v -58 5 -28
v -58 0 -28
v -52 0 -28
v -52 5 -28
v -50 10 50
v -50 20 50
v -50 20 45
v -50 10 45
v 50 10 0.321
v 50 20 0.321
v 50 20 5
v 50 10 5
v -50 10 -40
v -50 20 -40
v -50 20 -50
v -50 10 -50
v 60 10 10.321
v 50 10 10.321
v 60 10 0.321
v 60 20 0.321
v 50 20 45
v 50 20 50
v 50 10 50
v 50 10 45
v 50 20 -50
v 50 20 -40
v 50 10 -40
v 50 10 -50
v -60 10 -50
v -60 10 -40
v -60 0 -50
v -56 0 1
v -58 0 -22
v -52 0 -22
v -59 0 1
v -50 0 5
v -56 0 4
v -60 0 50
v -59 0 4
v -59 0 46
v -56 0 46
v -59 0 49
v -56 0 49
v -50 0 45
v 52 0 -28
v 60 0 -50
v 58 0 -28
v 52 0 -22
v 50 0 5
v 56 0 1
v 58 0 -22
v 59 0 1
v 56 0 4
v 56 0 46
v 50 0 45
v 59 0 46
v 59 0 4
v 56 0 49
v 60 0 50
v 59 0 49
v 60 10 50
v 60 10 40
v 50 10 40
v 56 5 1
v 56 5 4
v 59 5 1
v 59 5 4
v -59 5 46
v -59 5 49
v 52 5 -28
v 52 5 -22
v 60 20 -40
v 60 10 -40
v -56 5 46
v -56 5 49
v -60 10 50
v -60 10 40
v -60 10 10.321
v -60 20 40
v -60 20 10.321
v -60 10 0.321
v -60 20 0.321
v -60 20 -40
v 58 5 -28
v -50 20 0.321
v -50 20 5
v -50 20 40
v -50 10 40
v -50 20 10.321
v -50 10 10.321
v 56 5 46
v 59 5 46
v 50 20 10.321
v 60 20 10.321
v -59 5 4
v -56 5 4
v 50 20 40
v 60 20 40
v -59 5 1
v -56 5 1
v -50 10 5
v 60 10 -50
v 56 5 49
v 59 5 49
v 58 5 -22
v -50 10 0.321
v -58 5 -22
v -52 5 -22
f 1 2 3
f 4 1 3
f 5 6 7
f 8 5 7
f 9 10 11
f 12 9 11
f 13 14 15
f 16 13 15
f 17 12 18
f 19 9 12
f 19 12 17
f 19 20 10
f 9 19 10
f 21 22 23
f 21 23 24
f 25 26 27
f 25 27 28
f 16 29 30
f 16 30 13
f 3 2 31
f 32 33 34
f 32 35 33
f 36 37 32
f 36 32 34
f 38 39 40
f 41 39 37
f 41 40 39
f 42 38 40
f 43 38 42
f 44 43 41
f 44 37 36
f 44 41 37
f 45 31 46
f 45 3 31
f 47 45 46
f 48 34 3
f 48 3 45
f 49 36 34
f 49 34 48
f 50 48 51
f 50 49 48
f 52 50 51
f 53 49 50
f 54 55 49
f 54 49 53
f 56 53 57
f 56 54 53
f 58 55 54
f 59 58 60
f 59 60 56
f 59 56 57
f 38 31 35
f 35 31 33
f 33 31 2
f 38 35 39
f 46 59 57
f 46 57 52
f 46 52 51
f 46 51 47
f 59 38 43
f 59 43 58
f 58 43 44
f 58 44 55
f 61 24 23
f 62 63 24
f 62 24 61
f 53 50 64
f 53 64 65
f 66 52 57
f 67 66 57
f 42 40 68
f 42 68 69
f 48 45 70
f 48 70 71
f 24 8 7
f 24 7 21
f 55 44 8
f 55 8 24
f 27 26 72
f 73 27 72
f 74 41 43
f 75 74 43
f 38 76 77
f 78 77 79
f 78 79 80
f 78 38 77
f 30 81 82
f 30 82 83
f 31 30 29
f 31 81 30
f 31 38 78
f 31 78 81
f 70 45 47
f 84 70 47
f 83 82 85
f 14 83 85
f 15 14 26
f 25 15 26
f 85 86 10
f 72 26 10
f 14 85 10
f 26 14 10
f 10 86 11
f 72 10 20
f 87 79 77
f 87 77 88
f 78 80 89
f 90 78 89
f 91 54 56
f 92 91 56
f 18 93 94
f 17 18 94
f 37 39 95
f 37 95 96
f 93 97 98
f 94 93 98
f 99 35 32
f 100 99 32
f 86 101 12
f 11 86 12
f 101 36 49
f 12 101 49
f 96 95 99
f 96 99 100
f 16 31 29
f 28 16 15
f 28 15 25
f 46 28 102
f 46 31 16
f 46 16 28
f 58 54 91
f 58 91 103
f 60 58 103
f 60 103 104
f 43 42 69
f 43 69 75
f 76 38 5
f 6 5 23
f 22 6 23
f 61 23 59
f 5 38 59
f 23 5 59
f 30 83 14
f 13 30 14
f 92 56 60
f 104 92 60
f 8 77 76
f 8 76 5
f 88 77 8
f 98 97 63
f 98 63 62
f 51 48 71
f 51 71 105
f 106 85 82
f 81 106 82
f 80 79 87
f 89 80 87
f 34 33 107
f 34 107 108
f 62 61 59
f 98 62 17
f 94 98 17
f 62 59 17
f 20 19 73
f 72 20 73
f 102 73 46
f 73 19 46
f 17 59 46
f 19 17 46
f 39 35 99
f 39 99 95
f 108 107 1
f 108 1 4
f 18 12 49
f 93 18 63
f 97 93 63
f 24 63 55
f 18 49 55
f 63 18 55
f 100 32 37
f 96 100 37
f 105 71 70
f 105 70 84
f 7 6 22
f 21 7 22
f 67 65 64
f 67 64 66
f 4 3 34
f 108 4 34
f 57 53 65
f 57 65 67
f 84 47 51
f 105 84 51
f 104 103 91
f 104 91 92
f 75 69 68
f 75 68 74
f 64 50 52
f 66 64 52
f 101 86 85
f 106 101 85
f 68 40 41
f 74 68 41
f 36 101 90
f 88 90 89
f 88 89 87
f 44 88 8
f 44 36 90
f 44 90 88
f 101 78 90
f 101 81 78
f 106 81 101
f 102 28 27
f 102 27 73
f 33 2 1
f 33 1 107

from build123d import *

# Parameters (mm, degrees)
SKETCH1_W           = 120
SKETCH1_H           = 100
BOSS_EXTRUDE1_DEPTH = 20
SKETCH6_W           = 110
SKETCH6_H           = 40
CUT_EXTRUDE1_DEPTH  = 20
SKETCH6_3_W         = 5
SKETCH6_3_H         = 40
BOSS_EXTRUDE4_DEPTH = 20
SKETCH14_W          = 10
SKETCH14_H          = 10
CUT_EXTRUDE2_DEPTH  = 10
SKETCH15_W          = 10
SKETCH15_H          = 10
CUT_EXTRUDE3_DEPTH  = 10
SKETCH16_W          = 3
SKETCH16_H          = 3
SKETCH16_W_2        = 6
SKETCH16_H_2        = 6
CUT_EXTRUDE4_DEPTH  = 5


with BuildPart() as part:
    # Sketch1 → Boss-Extrude1 (new body)
    with BuildSketch(Plane(origin=(0, 0, 0), x_dir=(1, 0, 0), z_dir=(0, 1, 0))):
        Rectangle(SKETCH1_W, SKETCH1_H)
    extrude(amount=BOSS_EXTRUDE1_DEPTH)

    # Sketch6 → Cut-Extrude1 (cut)
    with BuildSketch(Plane.XZ):
        with Locations((0, 25)):
            Rectangle(SKETCH6_W, SKETCH6_H)
    extrude(amount=-CUT_EXTRUDE1_DEPTH, mode=Mode.SUBTRACT)

    # Sketch6<3> → Boss-Extrude4 (add)
    with BuildSketch(Plane.XZ):
        with Locations((-52.5, 25)):
            Rectangle(SKETCH6_3_W, SKETCH6_3_H)
        with Locations((52.5, 25)):
            Rectangle(SKETCH6_3_W, SKETCH6_3_H)
    extrude(amount=-BOSS_EXTRUDE4_DEPTH)

    # Sketch14 → Cut-Extrude2 (cut)
    with BuildSketch(Plane(origin=(0, 20, 0), x_dir=(1, 0, 0), z_dir=(0, 1, 0))):
        with Locations((55, -5.320888862)):
            Rectangle(SKETCH14_W, SKETCH14_H)
        with Locations((-55, -5.320888862)):
            Rectangle(SKETCH14_W, SKETCH14_H)
    extrude(amount=-CUT_EXTRUDE2_DEPTH, mode=Mode.SUBTRACT)

    # Sketch15 → Cut-Extrude3 (cut)
    with BuildSketch(Plane(origin=(0, 20, 0), x_dir=(1, 0, 0), z_dir=(0, 1, 0))):
        with Locations((-55, 45)):
            Rectangle(SKETCH15_W, SKETCH15_H)
        with Locations((55, 45)):
            Rectangle(SKETCH15_W, SKETCH15_H)
        with Locations((55, -45)):
            Rectangle(SKETCH15_W, SKETCH15_H)
        with Locations((-55, -45)):
            Rectangle(SKETCH15_W, SKETCH15_H)
    extrude(amount=-CUT_EXTRUDE3_DEPTH, mode=Mode.SUBTRACT)

    # Sketch16 → Cut-Extrude4 (cut)
    with BuildSketch(Plane.XZ):
        with Locations((-57.5, 47.5)):
            Rectangle(SKETCH16_W, SKETCH16_H)
        with Locations((-57.5, 2.5)):
            Rectangle(SKETCH16_W, SKETCH16_H)
        with Locations((57.5, 2.5)):
            Rectangle(SKETCH16_W, SKETCH16_H)
        with Locations((57.5, 47.5)):
            Rectangle(SKETCH16_W, SKETCH16_H)
        with Locations((55, -25)):
            Rectangle(SKETCH16_W_2, SKETCH16_H_2)
        with Locations((-55, -25)):
            Rectangle(SKETCH16_W_2, SKETCH16_H_2)
    extrude(amount=-CUT_EXTRUDE4_DEPTH, mode=Mode.SUBTRACT)


solid = part.part
